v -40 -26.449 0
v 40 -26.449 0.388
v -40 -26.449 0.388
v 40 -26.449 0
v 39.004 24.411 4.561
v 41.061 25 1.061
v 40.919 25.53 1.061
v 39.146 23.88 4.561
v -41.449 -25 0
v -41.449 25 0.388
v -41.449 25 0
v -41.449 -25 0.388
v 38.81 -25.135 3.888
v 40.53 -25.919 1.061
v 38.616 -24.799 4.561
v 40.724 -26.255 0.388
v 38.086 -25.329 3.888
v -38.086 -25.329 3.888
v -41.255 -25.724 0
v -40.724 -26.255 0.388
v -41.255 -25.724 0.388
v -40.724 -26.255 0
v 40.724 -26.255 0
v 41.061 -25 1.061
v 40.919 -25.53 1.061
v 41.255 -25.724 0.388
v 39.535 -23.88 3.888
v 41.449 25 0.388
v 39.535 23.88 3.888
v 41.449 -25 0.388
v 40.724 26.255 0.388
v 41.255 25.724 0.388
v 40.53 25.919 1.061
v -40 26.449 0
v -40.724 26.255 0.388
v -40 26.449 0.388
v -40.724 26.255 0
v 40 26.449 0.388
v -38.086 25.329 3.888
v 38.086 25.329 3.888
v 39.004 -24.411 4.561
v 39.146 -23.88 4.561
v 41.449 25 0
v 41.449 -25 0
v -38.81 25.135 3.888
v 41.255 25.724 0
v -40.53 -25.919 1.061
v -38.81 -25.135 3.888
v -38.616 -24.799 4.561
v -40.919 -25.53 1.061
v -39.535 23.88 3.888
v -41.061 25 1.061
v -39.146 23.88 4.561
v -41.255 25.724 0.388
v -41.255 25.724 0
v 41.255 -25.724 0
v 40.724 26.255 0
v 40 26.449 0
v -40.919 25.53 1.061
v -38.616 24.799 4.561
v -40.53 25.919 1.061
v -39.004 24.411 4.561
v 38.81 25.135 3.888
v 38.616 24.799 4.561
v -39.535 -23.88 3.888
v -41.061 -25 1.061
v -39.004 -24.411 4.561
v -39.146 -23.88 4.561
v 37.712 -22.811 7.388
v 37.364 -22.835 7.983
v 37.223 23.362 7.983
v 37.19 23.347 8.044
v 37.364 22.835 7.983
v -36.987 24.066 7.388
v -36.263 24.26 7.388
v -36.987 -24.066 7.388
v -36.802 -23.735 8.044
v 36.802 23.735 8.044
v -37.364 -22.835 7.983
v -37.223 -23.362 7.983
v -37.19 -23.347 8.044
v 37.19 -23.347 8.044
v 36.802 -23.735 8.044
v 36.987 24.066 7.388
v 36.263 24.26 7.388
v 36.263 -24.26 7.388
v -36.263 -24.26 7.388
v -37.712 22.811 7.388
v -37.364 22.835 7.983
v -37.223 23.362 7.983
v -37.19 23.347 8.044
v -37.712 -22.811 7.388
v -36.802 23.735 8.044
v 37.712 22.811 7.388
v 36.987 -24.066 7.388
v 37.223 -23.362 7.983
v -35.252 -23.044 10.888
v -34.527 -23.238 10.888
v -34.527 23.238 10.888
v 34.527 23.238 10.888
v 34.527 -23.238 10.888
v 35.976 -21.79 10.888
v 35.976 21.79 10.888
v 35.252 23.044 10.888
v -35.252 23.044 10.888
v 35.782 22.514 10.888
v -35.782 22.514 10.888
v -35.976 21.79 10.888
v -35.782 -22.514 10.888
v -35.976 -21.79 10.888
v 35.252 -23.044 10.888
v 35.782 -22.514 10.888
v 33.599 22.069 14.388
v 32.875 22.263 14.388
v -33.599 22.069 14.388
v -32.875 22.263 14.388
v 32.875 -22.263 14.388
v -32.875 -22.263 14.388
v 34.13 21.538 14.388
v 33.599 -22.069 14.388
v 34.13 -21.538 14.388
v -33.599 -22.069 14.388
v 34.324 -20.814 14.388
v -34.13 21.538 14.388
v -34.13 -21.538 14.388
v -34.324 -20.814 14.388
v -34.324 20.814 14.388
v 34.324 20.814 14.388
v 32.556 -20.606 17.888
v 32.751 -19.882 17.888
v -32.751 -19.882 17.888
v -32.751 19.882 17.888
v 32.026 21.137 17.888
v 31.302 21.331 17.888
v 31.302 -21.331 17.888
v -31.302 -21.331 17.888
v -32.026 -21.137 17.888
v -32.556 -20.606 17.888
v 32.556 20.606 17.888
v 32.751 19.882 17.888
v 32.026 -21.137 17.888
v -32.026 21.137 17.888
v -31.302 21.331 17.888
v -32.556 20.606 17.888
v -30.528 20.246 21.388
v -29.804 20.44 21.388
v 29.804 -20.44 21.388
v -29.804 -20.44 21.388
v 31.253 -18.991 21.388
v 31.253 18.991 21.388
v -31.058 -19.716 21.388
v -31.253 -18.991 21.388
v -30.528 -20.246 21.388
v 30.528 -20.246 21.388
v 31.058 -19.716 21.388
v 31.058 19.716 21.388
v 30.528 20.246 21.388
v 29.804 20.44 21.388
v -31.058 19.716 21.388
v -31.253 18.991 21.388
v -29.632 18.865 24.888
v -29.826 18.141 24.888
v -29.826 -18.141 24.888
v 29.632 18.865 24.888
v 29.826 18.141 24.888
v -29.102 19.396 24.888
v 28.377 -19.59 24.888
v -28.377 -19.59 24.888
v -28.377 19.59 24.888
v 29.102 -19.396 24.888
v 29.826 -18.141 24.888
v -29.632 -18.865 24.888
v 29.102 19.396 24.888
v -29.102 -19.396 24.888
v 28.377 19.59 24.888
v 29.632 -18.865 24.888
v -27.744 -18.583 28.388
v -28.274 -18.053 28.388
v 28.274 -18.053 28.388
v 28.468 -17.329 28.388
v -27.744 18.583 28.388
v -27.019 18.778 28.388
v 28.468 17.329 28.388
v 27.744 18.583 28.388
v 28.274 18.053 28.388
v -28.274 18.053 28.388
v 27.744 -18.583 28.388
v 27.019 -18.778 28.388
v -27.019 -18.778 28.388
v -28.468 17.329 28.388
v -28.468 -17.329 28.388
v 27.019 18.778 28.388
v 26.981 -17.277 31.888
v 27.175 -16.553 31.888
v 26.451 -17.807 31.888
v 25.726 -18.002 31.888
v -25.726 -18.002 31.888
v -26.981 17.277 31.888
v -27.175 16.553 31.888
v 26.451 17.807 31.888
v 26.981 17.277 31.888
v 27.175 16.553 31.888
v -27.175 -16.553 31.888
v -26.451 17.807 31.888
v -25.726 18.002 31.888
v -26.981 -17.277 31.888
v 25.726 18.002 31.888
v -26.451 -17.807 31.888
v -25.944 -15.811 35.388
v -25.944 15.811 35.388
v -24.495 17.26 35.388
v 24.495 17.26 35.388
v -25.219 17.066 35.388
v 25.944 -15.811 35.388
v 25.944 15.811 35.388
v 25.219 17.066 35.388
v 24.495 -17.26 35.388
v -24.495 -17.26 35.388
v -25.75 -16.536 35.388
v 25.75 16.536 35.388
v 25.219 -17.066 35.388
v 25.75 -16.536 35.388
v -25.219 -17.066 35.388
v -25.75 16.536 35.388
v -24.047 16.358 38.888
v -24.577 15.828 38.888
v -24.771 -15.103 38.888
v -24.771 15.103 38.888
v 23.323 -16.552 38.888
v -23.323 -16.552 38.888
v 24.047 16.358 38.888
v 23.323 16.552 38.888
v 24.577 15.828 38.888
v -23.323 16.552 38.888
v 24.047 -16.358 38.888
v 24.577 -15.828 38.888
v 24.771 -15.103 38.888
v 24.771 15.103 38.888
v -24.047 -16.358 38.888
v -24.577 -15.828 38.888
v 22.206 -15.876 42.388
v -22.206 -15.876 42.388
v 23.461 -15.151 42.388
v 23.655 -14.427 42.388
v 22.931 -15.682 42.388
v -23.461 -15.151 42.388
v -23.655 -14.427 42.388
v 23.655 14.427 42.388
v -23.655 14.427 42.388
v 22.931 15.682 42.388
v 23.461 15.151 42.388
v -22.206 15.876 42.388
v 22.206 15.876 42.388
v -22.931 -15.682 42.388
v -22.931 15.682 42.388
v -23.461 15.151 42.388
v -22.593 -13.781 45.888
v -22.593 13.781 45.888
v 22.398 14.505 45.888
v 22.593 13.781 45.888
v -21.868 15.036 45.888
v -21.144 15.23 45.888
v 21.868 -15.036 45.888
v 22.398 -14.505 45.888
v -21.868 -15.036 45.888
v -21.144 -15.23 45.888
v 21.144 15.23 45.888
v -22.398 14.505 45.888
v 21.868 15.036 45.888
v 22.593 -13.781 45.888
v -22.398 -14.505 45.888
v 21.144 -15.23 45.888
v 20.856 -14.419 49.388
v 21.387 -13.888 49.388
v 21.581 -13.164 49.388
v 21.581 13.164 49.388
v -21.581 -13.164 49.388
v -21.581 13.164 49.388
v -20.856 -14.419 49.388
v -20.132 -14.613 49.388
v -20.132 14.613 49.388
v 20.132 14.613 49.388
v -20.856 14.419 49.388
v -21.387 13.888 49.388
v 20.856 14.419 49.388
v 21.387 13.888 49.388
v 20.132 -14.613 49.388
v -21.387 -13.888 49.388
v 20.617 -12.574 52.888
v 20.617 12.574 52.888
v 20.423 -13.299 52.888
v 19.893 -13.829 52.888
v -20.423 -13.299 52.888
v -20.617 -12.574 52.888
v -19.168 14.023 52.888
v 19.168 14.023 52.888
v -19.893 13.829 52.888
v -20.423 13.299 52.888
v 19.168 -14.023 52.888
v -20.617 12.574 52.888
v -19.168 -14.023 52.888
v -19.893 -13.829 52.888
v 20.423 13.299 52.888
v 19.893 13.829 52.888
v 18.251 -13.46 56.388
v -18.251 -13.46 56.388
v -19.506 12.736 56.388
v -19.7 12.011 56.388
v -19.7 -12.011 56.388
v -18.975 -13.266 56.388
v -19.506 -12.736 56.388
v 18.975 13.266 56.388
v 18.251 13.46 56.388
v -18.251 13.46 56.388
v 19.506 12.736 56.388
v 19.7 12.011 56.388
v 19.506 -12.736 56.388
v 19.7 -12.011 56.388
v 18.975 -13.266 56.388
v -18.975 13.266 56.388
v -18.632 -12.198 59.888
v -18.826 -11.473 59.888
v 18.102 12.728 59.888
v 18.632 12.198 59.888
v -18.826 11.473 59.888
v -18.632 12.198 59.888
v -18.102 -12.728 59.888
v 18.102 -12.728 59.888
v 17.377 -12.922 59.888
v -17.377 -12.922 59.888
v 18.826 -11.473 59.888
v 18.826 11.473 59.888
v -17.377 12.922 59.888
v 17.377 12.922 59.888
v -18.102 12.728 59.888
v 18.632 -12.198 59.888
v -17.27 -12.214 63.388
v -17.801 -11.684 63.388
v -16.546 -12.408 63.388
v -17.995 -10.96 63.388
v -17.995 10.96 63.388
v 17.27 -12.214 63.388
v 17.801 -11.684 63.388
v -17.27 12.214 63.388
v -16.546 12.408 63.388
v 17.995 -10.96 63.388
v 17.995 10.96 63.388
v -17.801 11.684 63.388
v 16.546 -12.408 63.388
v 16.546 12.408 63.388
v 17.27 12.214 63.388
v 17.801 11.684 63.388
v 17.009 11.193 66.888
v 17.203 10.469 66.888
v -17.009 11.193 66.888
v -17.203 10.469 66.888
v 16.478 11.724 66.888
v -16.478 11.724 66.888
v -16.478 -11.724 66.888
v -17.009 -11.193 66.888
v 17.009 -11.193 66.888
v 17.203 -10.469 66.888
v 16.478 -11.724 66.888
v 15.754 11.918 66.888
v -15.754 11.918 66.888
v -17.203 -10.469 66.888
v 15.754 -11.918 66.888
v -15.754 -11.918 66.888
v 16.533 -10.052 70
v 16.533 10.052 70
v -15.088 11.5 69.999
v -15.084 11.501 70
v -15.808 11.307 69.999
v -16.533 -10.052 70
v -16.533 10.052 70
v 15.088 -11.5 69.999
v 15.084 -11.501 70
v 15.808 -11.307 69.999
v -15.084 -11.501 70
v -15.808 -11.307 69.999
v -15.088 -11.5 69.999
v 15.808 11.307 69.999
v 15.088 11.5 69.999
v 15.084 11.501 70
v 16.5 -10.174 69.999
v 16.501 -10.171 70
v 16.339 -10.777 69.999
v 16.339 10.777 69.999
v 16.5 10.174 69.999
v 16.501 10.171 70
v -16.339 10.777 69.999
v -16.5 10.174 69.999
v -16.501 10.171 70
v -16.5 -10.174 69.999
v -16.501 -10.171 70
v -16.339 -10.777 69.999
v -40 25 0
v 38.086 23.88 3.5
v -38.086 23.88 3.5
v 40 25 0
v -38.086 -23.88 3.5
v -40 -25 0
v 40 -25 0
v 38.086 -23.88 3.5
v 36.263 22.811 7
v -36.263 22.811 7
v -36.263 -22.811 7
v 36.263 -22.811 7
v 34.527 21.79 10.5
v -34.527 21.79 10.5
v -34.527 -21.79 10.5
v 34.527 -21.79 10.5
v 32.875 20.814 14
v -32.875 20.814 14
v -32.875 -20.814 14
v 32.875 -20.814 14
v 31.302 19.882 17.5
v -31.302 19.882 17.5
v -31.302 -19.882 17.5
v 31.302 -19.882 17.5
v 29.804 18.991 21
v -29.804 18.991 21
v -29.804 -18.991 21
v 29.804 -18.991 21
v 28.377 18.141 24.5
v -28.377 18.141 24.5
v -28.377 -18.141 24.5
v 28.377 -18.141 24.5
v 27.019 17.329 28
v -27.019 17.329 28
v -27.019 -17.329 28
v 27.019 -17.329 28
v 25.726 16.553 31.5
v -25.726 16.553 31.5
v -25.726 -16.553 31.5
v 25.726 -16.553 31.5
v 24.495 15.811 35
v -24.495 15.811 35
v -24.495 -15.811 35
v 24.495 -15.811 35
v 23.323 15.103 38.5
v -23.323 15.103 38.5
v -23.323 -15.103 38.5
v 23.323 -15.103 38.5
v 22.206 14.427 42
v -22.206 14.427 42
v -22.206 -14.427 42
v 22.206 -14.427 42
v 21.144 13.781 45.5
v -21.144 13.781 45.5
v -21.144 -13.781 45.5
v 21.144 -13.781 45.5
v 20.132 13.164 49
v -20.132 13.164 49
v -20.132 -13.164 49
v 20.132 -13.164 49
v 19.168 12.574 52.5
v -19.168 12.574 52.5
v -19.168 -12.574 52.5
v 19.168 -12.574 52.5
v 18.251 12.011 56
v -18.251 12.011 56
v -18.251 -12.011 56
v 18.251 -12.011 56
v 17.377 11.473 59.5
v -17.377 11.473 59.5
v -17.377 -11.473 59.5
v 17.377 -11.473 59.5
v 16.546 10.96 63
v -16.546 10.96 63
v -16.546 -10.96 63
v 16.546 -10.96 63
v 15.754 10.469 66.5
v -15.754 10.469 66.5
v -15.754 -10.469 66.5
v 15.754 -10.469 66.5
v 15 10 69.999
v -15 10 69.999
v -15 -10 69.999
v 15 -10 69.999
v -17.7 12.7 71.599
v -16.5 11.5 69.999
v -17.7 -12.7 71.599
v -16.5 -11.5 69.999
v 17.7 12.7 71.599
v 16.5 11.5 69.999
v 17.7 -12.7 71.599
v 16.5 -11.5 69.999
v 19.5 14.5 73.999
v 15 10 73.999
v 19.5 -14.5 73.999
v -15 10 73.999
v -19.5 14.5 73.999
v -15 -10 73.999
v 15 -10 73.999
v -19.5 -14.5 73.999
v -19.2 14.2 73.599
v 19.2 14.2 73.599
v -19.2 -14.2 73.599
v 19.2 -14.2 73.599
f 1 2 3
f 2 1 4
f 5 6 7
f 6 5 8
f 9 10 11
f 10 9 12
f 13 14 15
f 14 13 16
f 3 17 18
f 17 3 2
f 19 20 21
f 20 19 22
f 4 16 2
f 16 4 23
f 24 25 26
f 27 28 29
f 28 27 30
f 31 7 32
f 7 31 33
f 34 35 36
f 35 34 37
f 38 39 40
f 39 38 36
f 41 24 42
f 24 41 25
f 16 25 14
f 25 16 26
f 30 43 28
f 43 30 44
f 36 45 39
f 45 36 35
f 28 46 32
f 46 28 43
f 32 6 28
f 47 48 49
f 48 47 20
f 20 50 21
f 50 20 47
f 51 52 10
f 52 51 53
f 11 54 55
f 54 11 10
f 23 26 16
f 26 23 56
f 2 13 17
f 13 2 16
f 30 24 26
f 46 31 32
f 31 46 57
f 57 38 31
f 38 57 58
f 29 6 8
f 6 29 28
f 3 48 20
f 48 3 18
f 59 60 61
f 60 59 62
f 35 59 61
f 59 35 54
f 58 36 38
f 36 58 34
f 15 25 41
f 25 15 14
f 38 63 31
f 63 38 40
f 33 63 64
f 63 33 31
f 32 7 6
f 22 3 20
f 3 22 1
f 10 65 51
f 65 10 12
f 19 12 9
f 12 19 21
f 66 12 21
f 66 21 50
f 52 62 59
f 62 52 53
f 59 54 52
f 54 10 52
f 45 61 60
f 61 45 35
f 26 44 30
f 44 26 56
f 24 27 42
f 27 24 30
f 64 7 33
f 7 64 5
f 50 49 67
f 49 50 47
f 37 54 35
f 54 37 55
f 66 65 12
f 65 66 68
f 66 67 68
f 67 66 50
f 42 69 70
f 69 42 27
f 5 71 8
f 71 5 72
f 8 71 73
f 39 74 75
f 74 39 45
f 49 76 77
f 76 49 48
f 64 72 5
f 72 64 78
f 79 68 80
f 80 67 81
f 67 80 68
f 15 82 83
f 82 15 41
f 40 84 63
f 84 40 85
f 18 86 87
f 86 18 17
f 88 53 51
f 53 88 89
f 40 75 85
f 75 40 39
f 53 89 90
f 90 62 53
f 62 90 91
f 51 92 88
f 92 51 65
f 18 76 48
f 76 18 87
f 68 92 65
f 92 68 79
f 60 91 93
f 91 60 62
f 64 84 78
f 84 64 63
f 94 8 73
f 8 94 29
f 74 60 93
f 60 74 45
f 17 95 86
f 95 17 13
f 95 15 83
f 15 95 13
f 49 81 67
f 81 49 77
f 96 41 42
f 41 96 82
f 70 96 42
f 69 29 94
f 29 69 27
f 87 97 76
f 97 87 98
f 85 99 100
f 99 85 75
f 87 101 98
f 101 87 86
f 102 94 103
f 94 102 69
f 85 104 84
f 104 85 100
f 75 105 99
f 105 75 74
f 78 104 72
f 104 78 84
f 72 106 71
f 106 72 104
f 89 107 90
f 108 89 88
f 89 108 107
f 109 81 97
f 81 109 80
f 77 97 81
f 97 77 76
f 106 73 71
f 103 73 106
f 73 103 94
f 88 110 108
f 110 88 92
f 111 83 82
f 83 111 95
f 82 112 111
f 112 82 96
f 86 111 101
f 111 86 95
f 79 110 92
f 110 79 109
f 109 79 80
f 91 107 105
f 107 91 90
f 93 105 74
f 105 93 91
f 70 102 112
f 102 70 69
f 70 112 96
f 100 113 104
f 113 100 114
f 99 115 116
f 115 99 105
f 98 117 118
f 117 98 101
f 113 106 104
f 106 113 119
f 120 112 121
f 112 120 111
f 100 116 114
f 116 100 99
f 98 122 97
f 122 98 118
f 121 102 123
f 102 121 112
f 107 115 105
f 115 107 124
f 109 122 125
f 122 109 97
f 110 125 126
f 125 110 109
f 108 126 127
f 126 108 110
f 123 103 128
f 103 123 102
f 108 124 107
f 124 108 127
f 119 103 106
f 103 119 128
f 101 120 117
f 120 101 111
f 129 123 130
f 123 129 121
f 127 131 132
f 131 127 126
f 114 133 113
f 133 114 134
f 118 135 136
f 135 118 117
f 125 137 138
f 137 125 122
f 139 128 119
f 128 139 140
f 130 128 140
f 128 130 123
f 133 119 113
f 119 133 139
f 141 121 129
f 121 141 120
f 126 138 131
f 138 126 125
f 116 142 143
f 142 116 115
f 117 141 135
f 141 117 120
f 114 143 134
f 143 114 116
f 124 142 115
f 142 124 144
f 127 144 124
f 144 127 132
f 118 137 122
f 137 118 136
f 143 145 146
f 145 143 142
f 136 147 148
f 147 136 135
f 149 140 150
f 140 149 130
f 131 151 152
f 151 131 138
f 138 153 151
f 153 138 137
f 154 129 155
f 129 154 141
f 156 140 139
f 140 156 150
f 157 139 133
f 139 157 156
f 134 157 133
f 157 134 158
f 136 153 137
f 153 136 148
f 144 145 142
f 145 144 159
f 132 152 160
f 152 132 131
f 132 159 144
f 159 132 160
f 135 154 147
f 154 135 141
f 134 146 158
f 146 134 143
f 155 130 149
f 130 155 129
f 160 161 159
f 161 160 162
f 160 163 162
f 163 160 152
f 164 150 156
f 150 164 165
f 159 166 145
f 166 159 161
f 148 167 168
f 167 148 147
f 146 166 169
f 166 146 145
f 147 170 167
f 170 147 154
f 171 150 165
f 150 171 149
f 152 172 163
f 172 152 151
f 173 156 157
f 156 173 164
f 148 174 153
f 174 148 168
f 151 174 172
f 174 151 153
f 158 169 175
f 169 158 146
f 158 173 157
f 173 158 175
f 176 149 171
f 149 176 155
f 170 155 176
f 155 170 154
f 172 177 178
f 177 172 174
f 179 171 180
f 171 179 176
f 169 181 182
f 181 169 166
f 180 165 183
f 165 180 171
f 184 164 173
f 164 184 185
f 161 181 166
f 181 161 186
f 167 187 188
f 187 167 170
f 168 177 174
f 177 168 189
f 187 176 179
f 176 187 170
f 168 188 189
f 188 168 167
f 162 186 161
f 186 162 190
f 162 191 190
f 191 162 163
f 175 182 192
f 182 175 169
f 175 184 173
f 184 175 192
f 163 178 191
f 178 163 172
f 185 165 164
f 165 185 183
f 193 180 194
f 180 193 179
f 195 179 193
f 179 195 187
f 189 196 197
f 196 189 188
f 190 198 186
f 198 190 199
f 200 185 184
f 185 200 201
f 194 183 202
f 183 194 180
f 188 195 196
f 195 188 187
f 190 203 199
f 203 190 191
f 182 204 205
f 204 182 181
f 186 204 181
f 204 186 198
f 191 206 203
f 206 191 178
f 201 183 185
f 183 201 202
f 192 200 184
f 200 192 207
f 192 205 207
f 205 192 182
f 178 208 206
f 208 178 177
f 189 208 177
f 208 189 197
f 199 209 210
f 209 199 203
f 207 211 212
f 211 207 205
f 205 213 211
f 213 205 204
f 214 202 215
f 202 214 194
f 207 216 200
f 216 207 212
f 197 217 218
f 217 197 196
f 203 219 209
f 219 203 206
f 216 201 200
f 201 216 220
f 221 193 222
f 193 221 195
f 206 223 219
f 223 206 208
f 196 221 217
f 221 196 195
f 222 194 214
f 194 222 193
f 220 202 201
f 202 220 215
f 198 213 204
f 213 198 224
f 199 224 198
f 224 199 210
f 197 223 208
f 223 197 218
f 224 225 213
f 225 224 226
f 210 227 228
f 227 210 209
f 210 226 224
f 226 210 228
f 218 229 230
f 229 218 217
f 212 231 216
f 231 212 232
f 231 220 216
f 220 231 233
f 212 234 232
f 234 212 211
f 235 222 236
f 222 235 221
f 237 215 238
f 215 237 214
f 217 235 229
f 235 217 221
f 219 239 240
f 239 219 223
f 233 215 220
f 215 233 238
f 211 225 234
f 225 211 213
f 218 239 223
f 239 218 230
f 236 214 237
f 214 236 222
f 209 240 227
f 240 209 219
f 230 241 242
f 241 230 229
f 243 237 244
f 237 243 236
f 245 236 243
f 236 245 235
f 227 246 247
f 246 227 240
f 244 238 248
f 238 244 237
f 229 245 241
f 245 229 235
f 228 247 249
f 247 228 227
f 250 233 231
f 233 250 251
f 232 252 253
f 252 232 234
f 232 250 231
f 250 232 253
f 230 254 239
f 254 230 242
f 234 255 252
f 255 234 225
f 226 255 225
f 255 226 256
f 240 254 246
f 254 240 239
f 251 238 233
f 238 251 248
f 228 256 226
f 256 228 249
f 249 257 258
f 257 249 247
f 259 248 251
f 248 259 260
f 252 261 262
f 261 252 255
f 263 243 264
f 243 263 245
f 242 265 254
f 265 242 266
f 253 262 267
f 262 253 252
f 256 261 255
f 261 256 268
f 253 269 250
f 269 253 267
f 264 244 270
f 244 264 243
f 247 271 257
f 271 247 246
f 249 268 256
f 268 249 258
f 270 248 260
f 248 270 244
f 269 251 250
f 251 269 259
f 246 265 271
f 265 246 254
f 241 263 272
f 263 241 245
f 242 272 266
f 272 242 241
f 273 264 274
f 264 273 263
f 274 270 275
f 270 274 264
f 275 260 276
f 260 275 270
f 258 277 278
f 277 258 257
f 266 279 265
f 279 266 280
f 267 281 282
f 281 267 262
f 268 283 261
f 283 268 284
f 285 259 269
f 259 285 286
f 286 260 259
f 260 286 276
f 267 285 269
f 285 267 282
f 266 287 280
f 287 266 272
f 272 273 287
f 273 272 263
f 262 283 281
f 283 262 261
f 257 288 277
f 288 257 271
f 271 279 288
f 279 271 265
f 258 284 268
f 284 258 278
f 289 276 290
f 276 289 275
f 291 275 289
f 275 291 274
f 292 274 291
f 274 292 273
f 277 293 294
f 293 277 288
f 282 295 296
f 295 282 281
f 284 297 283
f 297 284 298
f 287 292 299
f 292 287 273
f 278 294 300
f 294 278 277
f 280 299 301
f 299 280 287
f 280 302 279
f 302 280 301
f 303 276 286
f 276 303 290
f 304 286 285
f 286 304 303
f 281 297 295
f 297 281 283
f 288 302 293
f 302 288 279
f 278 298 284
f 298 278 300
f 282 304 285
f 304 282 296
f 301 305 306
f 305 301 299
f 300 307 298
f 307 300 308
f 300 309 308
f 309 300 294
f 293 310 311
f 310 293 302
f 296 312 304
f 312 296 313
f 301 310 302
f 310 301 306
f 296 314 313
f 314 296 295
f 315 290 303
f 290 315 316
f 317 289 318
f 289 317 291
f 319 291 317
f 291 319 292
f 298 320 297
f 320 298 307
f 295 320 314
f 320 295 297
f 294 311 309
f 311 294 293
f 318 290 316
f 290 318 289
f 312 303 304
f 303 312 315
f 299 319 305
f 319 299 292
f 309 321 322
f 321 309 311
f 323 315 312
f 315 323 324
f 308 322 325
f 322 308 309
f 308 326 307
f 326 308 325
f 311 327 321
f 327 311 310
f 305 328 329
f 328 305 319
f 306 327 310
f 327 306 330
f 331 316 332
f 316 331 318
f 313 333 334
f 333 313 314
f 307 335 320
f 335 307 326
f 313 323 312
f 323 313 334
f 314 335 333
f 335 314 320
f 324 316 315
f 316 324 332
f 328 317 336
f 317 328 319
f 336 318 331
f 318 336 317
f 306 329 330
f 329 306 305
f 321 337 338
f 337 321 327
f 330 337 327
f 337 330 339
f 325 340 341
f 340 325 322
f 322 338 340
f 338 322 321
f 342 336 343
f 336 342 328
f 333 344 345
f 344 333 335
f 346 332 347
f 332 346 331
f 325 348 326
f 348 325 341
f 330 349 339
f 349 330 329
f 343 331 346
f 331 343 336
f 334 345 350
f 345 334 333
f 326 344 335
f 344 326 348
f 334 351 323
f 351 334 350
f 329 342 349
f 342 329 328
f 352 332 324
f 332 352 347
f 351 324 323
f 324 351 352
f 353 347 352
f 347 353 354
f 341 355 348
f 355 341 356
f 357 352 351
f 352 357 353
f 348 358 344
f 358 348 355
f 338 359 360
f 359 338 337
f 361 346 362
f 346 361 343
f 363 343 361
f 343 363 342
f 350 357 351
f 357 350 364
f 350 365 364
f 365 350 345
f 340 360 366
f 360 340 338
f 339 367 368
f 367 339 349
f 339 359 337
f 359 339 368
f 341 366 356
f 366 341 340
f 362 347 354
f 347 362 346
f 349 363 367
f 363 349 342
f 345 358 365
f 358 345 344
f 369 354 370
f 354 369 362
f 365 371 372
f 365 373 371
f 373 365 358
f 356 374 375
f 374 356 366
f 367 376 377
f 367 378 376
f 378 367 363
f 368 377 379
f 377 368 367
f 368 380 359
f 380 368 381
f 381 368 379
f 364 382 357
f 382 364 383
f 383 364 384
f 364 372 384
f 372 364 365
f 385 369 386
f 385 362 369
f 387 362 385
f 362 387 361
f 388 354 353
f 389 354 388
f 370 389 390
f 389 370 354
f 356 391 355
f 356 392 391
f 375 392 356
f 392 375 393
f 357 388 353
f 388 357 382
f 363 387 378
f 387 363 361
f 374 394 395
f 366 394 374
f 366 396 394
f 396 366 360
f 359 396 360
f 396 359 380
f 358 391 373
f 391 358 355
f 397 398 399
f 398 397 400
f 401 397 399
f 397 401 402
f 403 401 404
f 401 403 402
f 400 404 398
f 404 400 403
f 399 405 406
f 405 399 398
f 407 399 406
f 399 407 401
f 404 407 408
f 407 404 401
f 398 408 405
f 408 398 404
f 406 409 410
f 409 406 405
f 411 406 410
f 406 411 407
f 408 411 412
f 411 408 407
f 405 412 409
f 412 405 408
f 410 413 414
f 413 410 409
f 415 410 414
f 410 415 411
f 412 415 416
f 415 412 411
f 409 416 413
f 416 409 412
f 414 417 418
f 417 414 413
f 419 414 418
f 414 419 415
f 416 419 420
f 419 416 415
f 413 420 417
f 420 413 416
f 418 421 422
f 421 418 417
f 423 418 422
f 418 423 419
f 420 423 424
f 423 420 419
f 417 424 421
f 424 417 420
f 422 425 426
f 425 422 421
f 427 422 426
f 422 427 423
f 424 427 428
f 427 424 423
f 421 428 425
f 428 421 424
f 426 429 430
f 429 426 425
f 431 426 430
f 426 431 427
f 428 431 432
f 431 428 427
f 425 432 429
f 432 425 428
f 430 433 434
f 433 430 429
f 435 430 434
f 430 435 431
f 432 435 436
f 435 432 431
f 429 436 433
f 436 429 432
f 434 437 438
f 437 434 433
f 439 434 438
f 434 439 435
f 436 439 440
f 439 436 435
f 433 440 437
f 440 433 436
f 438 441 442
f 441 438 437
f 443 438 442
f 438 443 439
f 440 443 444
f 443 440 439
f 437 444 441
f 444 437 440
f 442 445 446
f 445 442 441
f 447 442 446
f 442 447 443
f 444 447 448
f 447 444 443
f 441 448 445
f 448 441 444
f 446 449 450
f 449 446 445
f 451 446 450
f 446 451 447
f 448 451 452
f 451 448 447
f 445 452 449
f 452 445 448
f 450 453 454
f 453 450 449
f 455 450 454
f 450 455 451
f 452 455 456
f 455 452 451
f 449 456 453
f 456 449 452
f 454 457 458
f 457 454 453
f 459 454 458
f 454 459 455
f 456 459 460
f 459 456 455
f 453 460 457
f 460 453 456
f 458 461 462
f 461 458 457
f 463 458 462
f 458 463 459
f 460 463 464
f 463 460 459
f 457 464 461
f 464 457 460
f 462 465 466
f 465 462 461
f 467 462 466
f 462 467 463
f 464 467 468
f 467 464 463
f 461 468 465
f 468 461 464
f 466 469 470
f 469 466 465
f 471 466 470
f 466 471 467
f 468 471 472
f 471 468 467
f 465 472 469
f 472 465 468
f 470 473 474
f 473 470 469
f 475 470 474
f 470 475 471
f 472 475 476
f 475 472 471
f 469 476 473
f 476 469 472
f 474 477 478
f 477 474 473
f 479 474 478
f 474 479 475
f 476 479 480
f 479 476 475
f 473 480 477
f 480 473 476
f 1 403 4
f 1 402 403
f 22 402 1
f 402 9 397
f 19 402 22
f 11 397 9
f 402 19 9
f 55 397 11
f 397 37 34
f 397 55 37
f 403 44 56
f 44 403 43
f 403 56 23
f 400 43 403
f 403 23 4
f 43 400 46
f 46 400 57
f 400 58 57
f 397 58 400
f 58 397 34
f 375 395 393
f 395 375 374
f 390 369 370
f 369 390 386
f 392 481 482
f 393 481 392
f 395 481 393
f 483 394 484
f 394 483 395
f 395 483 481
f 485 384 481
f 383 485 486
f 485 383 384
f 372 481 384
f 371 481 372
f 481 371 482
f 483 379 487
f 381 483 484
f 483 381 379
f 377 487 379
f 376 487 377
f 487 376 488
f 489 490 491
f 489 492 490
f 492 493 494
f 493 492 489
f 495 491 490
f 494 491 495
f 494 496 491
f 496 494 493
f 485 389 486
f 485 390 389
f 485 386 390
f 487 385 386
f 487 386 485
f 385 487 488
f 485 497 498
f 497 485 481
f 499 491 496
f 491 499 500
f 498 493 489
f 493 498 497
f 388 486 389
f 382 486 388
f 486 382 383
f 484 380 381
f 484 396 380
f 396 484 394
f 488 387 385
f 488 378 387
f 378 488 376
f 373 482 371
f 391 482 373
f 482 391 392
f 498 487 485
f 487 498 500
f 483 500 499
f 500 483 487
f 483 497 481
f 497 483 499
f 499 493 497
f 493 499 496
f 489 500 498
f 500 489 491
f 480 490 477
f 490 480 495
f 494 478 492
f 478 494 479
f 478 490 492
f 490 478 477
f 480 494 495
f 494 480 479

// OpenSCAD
use <tubemesh.scad>;

// exponential horn

length = 70;
throatWidth = 30;
throatHeight = 20;
mouthWidth = 80;
mouthHeight = 50;
wallThickness = 1.5;
numSections = 20;
flangeLength = 4;
flangeFlare = 3;

module dummy(){}

// exponent^length = ratio


function getExponent(ratio) = pow(ratio, 1/length);

wExp = getExponent(mouthWidth/throatWidth);
hExp = getExponent(mouthHeight/throatHeight);

sections = 
    [ for(i=[0:numSections])
        let(z=i/numSections*length,
            x=pow(wExp,length-z)*throatWidth/2,
            y=pow(hExp,length-z)*throatHeight/2)
        [ [x,y,z], [-x,y,z], [-x,-y,z], [x,-y,z] ] ];

module hornShape() {
    data = pointsAndFaces(sections,startCap=true,endCap=true,optimize=true);   
    polyhedron(points=data[0], faces=data[1]);
}

module hornShellQuick() {
    render(convexity=2)
    difference() {
        scale([(mouthWidth+wallThickness*2)/mouthWidth,(mouthHeight+wallThickness*2)/mouthHeight,1]) hornShape();
    }
}

module hornShellGood() {
    render(convexity=2)
    intersection() {
        difference() {
            minkowski() {
                hornShape();
                sphere(r=wallThickness,$fn=12);
            }
            hornShape();
        }
        translate([-mouthWidth/2-wallThickness,-mouthHeight/2-wallThickness,0])
        cube([mouthWidth+2*wallThickness,mouthHeight+2*wallThickness,length]);
    }
}

module flange() {
    if (flangeLength>0) {
        x1 = throatWidth/2+wallThickness;
        y1 = throatHeight/2+wallThickness;
        x2 = x1 + flangeFlare;
        y2 = y1 + flangeFlare;
        render(convexity=2)
        difference() {
            morphExtrude([[x1,y1],[-x1,y1],[-x1,-y1],[x1,-y1]], [[x2,y2],[-x2,y2],[-x2,-y2],[x2,-y2]], height=flangeLength);
            translate([-throatWidth/2,-throatHeight/2,-1]) cube([throatWidth,throatHeight,flangeLength+2]);
        }
    }
}

hornShellGood();
translate([0,0,length-0.001]) flange();
